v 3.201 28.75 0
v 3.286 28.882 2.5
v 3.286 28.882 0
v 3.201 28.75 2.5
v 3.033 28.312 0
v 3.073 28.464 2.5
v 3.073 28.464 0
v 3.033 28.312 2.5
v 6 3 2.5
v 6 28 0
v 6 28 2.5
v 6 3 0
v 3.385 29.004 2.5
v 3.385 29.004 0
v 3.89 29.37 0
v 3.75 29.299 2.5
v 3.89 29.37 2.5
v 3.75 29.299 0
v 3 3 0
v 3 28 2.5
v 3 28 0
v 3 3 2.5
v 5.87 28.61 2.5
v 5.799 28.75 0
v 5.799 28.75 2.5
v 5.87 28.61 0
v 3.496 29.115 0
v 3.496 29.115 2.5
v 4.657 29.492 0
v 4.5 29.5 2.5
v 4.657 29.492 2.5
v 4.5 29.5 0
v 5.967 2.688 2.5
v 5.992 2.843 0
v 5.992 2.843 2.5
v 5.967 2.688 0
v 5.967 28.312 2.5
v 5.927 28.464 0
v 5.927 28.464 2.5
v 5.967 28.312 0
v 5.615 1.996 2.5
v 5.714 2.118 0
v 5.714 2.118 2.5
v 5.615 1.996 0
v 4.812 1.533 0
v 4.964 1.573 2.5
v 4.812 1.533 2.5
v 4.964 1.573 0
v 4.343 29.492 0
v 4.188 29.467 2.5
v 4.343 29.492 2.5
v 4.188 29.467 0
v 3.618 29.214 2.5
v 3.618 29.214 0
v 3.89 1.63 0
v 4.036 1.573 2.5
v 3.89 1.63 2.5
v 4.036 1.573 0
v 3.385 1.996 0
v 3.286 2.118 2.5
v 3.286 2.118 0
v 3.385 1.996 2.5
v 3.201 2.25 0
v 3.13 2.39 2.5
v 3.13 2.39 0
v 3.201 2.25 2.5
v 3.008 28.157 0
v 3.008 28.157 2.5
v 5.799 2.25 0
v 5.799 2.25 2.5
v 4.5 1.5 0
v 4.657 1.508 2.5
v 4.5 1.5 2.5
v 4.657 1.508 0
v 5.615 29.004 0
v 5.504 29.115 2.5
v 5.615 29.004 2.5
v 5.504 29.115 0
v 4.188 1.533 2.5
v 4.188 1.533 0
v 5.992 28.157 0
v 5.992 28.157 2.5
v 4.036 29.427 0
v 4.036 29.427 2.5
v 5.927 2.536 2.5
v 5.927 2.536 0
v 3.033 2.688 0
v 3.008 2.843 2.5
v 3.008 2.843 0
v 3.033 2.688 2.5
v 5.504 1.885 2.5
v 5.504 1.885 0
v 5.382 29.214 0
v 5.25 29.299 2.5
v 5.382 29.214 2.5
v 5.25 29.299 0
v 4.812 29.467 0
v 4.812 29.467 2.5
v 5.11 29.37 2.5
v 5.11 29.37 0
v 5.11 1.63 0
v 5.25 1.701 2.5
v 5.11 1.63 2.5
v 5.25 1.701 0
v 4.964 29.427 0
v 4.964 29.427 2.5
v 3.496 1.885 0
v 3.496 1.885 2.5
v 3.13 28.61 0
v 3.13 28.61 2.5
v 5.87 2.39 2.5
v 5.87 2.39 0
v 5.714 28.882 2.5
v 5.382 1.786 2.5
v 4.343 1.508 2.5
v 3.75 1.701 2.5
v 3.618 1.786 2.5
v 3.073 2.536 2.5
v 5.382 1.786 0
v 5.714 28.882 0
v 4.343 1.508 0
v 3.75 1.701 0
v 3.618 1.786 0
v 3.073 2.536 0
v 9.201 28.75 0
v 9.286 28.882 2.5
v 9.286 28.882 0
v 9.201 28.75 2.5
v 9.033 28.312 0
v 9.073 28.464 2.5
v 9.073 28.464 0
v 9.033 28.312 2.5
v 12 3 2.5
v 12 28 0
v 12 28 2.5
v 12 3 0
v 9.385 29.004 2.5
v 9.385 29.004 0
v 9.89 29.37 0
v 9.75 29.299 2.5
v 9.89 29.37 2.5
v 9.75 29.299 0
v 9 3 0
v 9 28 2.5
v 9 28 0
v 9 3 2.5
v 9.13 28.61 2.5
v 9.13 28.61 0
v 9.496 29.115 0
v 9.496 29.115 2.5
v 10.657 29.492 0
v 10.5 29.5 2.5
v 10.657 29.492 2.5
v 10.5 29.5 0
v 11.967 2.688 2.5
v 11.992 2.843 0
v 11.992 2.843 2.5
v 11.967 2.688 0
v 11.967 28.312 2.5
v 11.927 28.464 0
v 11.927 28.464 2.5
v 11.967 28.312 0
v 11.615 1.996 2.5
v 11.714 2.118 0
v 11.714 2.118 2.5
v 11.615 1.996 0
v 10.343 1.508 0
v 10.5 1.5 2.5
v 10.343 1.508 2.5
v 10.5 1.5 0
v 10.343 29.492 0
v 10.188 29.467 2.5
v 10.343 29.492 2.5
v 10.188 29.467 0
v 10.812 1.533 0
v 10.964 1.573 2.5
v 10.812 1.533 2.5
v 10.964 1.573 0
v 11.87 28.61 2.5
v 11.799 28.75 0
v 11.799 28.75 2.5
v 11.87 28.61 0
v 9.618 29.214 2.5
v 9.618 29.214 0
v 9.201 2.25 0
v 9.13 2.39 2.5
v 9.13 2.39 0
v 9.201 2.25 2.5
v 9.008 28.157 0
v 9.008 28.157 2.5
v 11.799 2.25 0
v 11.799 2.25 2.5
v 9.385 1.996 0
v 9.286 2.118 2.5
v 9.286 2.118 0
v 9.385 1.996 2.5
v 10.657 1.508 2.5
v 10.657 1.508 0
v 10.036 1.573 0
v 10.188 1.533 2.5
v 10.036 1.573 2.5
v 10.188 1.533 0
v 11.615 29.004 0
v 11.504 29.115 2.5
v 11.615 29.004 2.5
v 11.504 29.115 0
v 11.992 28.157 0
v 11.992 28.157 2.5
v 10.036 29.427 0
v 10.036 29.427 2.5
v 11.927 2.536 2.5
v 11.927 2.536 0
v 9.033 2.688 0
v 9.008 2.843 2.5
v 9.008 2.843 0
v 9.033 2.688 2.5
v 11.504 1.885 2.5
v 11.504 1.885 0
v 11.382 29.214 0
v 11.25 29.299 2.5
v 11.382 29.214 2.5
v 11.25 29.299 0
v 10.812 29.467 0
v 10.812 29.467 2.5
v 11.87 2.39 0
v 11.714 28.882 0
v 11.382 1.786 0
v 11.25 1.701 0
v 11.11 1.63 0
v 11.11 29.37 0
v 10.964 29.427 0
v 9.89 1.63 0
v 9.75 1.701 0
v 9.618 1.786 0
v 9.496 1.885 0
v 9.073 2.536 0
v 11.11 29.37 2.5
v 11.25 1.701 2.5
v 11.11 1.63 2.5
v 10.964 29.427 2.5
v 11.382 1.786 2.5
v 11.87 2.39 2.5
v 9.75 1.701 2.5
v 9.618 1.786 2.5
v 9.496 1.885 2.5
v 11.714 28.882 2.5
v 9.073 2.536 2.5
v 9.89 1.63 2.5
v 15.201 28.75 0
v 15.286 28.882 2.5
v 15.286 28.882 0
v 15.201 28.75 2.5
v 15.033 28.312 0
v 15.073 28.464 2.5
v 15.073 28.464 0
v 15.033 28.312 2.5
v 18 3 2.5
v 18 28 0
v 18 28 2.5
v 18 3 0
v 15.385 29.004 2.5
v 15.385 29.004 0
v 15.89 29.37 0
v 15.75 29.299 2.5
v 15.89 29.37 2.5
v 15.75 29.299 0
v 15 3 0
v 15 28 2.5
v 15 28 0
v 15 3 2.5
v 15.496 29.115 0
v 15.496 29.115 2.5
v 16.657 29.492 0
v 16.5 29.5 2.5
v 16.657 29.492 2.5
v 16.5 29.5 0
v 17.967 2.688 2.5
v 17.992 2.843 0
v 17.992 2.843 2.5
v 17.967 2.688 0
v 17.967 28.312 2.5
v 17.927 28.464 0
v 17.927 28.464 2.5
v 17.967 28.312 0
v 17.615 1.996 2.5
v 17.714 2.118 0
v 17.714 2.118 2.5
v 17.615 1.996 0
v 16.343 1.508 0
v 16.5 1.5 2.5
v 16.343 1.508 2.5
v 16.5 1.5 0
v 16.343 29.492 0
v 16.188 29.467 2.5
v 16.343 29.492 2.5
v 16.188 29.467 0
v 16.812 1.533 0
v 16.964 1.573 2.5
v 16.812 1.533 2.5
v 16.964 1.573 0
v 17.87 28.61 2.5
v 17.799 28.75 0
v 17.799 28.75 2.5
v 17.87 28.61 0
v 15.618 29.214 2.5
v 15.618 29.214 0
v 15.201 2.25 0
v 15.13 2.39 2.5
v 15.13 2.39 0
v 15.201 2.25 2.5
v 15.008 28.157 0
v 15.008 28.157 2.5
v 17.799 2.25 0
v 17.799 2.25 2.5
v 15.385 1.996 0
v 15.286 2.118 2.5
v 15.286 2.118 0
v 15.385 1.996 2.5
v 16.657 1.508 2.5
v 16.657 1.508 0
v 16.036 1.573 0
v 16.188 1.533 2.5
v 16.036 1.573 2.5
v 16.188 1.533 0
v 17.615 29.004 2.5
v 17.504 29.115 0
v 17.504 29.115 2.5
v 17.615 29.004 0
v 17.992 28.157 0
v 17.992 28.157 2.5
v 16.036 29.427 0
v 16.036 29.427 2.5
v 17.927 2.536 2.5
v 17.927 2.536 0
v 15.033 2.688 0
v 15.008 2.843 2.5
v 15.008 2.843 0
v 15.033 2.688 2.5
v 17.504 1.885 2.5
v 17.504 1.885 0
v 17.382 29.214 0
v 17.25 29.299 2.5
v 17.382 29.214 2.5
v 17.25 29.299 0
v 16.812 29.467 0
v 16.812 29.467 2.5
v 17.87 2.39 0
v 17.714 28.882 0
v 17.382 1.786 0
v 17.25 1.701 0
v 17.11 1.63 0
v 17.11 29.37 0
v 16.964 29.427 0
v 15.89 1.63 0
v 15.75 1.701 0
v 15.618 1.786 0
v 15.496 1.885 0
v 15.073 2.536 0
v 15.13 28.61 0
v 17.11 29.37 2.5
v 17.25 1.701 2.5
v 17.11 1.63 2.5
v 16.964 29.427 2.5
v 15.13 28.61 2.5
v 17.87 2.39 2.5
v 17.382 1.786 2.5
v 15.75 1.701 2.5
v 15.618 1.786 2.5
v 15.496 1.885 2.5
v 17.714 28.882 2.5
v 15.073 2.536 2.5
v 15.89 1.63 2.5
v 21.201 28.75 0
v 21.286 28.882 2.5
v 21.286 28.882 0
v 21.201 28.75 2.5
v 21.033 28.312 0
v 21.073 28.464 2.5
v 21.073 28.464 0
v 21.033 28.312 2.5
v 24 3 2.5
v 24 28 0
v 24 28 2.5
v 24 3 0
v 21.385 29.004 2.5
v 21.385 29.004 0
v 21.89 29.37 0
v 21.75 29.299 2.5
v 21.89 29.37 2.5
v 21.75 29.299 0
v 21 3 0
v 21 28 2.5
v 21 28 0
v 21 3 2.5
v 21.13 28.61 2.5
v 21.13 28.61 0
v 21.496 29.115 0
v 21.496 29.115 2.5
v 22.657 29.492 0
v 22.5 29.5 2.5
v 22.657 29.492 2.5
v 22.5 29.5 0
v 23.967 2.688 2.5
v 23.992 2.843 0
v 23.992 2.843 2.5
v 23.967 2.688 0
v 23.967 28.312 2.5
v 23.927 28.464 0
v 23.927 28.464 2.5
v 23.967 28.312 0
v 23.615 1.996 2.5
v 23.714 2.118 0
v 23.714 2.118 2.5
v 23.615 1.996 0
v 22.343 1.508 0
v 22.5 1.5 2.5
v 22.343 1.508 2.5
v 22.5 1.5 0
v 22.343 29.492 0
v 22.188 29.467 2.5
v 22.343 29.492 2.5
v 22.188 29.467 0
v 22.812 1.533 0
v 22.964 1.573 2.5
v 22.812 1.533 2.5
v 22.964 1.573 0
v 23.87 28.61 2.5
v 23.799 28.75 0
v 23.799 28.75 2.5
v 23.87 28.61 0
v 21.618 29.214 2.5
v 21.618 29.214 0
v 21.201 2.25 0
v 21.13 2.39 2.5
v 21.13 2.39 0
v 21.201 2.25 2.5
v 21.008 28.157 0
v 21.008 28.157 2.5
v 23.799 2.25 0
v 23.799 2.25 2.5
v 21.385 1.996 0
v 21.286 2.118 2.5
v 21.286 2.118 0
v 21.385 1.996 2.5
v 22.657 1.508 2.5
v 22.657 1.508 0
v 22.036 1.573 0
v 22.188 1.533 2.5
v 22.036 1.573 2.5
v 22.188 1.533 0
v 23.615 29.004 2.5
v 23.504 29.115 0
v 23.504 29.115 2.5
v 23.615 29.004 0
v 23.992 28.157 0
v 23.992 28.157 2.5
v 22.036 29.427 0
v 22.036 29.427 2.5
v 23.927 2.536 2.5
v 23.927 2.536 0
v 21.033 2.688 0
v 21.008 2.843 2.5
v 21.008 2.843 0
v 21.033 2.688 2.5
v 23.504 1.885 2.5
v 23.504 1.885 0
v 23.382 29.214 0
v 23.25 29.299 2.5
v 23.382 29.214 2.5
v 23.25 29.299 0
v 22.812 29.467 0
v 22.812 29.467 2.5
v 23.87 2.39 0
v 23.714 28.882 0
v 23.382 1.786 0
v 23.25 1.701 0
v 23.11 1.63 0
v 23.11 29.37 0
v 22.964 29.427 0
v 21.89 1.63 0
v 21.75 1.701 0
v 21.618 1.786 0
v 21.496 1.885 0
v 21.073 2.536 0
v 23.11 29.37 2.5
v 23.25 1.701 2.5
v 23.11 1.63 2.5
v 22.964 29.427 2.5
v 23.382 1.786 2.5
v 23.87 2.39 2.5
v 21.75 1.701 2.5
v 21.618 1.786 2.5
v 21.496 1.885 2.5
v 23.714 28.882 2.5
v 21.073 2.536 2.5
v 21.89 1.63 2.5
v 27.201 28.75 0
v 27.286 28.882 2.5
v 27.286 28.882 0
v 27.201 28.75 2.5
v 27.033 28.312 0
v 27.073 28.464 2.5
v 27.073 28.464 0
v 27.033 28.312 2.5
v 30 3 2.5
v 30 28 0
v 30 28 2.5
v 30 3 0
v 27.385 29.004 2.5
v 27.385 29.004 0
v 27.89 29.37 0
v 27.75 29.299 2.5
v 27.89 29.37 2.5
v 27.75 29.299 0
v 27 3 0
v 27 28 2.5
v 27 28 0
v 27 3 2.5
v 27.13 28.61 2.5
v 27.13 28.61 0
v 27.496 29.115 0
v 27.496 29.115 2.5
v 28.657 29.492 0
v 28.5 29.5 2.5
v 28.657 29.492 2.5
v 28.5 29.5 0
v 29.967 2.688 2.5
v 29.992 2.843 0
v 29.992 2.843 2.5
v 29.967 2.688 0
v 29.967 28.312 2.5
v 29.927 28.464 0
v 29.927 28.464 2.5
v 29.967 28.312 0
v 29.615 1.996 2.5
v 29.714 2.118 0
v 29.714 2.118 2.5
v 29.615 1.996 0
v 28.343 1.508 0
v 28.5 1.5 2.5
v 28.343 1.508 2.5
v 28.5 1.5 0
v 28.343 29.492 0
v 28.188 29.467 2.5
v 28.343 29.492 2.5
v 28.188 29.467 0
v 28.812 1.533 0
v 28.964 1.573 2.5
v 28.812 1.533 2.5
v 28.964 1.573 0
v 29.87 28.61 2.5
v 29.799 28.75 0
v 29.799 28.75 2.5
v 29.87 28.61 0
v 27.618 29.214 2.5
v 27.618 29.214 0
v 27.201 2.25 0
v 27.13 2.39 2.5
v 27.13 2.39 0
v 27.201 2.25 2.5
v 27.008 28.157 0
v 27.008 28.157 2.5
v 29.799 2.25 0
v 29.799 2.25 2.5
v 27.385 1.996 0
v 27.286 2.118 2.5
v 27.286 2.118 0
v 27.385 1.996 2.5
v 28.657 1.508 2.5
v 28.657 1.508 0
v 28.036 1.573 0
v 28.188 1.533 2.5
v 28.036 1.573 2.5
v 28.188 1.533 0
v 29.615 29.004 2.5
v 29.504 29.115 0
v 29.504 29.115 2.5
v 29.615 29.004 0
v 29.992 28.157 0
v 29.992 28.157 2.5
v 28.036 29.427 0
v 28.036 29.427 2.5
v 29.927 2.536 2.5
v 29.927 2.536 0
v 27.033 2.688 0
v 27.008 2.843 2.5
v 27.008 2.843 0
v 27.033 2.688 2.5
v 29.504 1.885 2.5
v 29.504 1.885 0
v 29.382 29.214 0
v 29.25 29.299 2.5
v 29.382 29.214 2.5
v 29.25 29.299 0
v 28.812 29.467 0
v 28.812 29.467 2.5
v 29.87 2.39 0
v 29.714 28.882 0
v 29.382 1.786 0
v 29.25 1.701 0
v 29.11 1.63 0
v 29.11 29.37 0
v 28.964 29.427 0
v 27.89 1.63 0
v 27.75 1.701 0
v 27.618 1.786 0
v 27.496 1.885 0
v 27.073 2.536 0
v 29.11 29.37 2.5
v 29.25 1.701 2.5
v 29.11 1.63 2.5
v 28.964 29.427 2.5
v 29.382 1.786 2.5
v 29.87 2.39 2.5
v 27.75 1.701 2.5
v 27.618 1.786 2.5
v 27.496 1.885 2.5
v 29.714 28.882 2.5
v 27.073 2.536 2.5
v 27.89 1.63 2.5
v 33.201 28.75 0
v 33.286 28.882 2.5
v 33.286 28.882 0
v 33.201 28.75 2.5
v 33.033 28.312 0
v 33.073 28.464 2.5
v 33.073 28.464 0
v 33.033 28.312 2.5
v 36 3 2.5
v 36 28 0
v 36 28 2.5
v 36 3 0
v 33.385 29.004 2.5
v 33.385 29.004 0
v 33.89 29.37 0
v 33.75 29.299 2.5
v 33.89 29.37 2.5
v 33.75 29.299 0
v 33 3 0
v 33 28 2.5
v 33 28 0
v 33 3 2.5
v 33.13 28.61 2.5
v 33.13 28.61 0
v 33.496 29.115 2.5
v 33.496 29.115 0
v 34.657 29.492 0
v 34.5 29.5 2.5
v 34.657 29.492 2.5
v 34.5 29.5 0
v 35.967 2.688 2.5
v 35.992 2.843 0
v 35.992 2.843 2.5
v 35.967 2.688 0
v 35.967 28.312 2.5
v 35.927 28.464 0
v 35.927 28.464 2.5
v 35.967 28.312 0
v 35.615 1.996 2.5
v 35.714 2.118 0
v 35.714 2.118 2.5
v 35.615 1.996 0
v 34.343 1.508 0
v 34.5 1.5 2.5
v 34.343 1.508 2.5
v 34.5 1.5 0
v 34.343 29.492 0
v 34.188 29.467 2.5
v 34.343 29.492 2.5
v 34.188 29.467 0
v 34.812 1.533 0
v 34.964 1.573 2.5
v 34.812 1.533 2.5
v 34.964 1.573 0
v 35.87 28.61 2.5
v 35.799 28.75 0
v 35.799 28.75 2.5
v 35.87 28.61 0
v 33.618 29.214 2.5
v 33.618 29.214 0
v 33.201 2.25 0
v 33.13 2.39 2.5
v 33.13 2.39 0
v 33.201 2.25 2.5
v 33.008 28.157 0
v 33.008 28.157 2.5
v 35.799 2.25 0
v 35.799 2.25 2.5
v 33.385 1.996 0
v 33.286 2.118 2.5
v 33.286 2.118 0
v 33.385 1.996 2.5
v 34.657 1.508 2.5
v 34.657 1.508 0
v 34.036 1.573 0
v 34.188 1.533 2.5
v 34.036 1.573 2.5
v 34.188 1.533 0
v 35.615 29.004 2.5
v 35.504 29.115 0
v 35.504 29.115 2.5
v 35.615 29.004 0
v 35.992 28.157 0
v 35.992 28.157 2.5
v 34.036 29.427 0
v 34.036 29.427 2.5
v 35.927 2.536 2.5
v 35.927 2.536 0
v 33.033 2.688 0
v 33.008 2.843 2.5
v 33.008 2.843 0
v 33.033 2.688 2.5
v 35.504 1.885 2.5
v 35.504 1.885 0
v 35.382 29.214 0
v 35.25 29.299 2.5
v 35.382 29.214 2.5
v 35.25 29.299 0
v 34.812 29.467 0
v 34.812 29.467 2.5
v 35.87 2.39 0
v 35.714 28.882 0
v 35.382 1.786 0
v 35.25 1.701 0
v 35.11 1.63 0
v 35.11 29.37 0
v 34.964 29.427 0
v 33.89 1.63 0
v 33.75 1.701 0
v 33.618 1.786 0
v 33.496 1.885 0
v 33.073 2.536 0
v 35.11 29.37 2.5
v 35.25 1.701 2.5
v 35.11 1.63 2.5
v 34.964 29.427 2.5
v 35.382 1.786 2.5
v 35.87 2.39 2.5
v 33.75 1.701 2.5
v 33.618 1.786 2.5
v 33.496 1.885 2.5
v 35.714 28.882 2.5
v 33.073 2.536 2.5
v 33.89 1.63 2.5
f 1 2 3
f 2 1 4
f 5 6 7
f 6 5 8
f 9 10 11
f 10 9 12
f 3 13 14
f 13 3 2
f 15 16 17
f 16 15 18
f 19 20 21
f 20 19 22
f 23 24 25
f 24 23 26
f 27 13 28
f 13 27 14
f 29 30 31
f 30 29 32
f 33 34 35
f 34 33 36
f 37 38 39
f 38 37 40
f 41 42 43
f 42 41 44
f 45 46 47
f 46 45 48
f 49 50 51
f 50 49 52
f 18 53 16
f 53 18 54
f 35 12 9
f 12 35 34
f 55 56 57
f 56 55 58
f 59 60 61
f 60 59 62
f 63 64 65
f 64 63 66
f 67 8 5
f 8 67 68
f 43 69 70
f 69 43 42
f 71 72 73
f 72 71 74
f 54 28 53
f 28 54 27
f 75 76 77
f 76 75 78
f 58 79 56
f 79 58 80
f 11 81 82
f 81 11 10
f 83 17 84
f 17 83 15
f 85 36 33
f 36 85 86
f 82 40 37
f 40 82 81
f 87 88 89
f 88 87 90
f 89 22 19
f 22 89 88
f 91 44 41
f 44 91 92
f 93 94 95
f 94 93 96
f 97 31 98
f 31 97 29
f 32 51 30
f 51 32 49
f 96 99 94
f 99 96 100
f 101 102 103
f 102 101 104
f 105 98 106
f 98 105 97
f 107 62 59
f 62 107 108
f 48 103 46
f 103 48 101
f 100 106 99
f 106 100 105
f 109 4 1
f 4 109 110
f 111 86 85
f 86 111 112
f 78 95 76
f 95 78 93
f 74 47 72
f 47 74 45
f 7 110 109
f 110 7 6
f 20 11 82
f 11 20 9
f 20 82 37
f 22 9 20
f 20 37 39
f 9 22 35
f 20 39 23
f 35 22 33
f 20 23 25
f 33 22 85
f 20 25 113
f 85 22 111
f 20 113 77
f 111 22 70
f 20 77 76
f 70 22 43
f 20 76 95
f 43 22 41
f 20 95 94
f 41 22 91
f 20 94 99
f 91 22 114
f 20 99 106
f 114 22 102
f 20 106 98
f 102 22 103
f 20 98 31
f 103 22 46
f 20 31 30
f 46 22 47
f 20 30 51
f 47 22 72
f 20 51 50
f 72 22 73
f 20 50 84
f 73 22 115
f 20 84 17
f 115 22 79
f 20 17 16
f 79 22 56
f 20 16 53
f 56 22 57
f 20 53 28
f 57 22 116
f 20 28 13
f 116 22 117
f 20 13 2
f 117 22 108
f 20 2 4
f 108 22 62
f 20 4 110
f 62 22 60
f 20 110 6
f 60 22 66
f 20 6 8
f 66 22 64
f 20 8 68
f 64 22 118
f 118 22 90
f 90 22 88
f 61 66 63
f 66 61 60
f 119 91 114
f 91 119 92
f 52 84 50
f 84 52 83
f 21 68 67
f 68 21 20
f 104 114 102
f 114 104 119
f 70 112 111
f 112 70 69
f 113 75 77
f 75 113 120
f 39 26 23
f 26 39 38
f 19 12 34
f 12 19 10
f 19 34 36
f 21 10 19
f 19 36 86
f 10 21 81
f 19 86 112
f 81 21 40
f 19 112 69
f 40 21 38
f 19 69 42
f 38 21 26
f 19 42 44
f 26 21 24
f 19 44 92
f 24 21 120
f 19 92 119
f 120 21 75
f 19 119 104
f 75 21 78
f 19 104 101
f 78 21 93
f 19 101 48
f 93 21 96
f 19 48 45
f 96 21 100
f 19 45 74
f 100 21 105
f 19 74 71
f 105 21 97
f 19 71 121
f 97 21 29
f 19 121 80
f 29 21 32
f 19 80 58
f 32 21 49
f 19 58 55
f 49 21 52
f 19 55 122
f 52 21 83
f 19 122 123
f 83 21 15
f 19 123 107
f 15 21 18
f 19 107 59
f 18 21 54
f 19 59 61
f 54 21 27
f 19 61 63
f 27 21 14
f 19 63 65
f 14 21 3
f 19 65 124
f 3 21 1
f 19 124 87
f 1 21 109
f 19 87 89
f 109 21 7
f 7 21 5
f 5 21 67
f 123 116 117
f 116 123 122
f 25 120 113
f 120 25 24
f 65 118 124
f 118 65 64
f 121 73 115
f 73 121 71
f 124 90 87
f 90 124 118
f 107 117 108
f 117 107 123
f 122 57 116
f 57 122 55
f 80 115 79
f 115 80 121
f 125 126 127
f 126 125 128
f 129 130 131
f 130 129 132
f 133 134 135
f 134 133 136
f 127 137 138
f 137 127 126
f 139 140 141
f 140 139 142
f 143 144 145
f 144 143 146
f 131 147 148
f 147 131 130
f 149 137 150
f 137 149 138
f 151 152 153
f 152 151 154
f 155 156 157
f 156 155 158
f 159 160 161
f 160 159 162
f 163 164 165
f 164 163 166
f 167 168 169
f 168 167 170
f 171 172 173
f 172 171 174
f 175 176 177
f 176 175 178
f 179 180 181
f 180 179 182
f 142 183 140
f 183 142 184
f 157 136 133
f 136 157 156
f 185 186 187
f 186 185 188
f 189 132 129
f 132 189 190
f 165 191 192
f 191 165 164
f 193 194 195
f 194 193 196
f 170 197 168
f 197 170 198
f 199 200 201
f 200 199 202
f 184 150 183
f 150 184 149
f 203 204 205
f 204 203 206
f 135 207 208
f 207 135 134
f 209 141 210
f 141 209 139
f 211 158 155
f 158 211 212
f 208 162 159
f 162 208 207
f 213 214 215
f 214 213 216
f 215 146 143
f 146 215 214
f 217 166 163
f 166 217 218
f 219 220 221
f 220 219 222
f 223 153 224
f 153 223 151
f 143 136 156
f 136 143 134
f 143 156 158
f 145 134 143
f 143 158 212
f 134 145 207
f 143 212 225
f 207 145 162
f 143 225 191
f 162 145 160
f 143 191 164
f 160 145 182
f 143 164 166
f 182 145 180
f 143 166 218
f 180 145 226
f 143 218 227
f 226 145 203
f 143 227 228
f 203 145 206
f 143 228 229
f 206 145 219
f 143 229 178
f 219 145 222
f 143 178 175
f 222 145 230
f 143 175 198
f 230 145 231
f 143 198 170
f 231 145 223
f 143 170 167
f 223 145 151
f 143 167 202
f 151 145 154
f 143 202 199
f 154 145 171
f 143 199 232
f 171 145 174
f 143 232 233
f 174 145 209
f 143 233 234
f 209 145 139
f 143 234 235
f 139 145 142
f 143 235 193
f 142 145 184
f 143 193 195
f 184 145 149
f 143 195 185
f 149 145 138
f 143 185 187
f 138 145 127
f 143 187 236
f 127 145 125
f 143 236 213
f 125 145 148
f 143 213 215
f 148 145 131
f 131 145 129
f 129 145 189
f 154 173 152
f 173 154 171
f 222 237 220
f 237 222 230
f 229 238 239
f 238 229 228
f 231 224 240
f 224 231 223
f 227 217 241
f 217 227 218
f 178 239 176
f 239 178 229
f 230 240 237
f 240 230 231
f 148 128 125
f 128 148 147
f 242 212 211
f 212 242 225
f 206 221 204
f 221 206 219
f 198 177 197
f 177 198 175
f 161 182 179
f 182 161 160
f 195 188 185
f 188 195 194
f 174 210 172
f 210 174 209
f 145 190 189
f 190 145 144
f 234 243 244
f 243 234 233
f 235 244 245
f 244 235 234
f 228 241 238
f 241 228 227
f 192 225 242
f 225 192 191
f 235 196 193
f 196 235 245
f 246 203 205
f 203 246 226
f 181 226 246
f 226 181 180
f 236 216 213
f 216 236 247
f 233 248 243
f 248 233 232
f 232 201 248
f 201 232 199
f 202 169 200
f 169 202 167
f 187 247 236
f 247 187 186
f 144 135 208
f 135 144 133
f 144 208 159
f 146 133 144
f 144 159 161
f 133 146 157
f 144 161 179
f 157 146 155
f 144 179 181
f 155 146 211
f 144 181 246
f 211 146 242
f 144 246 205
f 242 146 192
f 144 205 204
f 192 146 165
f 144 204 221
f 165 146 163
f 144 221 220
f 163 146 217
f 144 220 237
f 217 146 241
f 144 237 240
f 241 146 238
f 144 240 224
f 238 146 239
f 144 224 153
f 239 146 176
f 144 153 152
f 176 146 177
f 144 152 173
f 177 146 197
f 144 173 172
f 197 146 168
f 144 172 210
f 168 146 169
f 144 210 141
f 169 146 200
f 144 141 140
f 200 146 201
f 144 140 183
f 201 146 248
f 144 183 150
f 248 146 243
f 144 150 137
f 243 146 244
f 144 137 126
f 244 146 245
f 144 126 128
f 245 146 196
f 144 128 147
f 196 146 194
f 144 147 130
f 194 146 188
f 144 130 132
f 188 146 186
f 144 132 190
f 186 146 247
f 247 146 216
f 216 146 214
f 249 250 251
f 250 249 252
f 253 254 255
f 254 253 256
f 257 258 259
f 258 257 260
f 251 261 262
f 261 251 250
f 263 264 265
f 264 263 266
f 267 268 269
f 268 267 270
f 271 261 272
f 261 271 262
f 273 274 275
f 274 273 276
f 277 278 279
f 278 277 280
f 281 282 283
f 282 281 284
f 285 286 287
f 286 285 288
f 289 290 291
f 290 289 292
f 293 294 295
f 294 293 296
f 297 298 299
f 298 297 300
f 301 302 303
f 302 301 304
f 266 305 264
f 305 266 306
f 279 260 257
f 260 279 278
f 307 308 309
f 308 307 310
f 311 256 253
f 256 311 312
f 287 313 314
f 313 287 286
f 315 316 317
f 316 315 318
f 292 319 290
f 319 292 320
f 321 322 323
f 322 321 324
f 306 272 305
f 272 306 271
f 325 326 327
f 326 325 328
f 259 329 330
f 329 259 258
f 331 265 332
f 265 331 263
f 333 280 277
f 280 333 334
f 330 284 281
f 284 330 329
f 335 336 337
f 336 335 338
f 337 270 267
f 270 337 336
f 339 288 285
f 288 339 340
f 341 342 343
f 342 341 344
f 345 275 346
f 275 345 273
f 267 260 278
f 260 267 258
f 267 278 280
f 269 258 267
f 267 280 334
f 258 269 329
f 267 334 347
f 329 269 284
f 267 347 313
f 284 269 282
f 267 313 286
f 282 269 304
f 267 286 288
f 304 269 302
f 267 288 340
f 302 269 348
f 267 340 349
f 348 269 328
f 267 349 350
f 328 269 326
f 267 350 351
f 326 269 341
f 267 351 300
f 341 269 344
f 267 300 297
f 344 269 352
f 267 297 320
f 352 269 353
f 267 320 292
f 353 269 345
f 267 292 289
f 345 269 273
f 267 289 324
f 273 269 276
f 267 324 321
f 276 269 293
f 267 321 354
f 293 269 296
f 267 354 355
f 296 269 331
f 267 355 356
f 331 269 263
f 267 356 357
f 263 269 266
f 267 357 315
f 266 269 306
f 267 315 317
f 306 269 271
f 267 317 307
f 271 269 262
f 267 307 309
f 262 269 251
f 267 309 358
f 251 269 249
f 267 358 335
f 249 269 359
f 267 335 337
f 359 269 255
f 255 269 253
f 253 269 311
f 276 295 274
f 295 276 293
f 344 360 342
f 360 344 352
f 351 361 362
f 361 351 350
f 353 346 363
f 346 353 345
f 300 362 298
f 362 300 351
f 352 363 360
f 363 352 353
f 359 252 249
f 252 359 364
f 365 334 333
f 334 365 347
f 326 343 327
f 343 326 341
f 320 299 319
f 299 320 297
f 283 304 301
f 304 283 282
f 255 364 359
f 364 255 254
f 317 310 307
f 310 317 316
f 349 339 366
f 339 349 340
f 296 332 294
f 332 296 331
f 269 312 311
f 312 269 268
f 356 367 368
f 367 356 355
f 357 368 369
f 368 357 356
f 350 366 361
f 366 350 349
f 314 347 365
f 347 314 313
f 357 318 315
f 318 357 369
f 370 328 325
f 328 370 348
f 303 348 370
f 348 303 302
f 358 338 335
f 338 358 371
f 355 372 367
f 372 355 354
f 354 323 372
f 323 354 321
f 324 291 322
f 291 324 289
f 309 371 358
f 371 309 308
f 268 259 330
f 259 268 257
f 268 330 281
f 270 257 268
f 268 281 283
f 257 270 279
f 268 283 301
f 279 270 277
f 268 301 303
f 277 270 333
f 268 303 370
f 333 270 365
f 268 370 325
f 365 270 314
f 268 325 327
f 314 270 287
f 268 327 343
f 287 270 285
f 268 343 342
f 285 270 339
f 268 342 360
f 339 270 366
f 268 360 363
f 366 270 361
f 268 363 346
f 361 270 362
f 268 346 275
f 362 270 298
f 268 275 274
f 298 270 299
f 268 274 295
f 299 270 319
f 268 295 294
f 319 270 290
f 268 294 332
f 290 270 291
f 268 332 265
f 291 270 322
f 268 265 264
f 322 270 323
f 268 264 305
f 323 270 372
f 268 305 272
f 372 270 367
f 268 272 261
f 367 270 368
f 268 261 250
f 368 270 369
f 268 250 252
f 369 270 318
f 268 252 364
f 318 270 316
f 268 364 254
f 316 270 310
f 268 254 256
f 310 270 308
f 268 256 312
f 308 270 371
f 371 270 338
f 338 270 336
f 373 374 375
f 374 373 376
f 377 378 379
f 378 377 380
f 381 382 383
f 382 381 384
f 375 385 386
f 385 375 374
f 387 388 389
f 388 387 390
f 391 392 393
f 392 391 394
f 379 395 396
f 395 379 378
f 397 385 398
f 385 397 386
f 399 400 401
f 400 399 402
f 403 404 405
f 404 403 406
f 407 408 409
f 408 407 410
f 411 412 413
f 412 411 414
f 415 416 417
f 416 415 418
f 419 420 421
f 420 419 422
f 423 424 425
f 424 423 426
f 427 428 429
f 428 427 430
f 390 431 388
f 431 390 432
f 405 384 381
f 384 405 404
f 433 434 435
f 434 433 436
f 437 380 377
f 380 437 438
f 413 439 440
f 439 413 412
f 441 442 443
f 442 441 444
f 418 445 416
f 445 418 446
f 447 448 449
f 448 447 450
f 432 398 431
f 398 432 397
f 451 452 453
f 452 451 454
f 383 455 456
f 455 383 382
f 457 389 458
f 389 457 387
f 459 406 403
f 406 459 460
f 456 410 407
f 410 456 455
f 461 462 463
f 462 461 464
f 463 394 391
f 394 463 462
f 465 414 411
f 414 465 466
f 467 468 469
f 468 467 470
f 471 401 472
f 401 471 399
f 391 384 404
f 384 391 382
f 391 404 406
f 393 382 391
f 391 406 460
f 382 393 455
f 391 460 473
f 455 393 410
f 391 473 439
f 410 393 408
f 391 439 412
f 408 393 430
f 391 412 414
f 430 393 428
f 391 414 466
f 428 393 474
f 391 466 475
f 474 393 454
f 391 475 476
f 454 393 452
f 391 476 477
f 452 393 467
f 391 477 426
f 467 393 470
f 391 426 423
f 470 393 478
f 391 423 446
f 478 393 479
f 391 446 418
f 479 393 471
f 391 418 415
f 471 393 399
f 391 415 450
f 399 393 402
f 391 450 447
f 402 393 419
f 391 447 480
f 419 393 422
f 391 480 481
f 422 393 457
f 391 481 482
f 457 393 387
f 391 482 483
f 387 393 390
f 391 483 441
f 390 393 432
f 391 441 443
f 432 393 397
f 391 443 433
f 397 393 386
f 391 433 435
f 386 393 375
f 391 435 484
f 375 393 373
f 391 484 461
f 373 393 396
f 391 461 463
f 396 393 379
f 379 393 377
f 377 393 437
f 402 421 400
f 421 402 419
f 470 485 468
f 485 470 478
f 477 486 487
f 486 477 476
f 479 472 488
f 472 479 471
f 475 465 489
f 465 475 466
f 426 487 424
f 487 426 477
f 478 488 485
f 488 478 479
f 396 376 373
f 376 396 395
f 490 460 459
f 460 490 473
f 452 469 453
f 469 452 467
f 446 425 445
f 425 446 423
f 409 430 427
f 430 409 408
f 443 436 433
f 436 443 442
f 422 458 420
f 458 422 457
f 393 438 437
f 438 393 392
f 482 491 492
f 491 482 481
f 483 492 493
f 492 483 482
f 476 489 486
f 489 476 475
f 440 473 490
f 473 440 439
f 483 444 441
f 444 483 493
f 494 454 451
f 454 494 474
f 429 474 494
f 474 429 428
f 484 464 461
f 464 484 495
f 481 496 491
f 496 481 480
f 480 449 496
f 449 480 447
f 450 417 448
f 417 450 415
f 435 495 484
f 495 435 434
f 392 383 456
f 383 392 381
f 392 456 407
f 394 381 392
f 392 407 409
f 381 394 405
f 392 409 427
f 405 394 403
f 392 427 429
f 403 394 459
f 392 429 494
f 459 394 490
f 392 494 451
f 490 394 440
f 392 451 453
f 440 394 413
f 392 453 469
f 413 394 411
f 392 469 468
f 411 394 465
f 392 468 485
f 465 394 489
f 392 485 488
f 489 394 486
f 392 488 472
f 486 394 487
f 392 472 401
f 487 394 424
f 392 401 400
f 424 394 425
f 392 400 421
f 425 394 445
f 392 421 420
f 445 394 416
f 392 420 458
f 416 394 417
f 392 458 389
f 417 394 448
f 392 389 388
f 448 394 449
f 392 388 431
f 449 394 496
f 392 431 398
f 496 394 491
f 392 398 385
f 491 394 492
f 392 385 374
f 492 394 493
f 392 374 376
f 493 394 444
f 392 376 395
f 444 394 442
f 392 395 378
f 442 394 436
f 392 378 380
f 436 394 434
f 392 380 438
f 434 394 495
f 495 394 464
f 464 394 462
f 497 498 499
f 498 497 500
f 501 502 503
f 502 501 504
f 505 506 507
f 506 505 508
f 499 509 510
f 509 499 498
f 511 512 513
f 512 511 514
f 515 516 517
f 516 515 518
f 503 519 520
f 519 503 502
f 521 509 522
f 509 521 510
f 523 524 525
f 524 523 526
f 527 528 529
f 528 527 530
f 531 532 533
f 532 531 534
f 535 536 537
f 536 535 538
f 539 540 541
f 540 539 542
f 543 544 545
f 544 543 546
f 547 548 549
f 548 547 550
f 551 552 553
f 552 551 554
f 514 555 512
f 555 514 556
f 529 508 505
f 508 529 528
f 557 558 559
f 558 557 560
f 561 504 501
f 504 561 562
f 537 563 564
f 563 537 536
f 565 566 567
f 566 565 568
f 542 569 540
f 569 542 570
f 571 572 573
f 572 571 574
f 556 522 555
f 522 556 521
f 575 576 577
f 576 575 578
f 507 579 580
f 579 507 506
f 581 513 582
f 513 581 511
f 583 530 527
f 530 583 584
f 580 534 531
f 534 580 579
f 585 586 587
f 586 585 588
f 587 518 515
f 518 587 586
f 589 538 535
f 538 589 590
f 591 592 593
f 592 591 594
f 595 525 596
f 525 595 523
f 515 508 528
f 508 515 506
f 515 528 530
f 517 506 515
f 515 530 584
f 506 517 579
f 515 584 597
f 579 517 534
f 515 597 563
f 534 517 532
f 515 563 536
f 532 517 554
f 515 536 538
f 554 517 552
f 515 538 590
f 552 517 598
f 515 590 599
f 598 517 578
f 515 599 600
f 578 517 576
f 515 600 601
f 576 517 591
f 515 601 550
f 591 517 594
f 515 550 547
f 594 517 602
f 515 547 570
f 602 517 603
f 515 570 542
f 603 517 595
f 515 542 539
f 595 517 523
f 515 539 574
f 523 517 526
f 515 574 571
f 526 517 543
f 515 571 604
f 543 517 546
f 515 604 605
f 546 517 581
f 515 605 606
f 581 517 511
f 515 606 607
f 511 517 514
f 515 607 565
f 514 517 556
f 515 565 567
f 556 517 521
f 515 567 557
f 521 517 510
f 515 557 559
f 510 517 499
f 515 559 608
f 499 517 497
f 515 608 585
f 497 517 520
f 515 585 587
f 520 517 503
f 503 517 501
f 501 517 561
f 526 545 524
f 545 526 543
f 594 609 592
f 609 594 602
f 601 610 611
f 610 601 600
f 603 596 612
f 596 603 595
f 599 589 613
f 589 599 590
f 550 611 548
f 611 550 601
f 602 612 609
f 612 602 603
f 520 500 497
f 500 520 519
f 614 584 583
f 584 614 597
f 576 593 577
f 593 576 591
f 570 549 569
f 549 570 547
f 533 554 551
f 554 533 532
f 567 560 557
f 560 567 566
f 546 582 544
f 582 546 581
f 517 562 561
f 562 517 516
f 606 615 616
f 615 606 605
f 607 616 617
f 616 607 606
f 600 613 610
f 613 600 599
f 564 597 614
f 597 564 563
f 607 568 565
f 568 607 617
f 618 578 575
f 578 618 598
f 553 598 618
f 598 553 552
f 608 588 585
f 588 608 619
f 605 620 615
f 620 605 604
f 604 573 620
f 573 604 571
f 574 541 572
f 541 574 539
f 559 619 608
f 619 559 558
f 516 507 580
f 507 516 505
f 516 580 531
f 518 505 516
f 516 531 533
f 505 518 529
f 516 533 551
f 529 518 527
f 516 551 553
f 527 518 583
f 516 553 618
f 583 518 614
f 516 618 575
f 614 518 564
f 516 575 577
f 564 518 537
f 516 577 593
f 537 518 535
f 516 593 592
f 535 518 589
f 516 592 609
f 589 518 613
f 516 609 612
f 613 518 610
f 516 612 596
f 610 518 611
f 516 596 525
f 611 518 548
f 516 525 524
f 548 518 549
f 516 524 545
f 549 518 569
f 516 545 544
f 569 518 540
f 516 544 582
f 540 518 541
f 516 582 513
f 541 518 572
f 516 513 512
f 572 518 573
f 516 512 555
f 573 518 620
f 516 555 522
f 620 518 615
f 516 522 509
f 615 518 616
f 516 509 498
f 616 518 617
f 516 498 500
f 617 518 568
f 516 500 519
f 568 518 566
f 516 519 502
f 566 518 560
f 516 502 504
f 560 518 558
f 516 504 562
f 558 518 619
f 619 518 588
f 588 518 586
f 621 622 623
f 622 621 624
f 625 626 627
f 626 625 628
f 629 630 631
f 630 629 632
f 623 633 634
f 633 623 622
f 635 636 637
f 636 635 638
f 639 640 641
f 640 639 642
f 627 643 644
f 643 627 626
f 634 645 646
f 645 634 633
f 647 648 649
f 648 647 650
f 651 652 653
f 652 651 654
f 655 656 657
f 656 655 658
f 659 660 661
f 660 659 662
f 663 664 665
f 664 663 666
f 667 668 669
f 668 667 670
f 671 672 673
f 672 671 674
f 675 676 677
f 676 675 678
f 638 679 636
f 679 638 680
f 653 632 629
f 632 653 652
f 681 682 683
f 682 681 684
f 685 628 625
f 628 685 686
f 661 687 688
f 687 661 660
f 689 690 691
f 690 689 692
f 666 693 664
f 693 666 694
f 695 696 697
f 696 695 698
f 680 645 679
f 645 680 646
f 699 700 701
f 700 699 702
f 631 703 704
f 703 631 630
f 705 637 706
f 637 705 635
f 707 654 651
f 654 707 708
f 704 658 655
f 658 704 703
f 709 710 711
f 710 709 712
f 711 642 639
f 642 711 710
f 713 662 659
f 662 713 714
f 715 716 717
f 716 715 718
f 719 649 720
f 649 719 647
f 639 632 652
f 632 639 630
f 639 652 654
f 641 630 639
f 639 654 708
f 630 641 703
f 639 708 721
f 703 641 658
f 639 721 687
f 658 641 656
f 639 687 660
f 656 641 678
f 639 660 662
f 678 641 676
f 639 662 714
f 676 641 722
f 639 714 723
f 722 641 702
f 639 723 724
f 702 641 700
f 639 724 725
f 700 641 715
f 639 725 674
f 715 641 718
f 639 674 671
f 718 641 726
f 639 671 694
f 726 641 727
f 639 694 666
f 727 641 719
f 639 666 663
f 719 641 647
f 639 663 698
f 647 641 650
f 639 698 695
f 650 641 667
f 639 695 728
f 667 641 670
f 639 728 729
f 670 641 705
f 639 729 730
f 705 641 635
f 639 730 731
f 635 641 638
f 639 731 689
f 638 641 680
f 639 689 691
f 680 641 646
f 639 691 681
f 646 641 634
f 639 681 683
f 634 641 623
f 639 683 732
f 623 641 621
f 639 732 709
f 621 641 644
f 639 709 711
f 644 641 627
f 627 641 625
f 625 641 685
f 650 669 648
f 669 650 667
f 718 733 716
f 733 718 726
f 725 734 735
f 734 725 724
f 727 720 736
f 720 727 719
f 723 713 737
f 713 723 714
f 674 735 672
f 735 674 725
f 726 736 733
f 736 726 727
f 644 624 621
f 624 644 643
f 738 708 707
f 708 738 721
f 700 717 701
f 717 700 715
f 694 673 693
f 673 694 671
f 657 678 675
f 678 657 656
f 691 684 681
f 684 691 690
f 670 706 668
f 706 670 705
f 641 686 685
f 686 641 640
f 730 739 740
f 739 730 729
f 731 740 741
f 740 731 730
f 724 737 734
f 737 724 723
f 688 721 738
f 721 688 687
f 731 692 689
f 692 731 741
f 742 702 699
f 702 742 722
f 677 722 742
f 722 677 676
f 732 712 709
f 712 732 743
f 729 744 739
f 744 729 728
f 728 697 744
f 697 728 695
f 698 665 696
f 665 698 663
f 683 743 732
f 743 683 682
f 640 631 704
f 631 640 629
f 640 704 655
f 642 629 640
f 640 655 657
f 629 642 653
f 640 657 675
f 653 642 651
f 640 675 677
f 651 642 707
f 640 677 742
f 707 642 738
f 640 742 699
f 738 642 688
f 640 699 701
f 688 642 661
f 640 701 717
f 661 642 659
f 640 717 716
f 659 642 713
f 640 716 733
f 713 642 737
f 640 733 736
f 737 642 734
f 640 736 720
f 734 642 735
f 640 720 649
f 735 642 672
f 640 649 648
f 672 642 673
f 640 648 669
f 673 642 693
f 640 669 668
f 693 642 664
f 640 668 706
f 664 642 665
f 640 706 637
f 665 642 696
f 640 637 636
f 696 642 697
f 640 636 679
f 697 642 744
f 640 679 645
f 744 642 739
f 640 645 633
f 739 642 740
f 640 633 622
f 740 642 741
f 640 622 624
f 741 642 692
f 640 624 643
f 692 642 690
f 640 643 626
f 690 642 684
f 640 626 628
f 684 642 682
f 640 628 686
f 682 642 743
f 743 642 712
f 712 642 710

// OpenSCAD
totalWidth 			= 	40	;
totalHeight 		= 	30	;
materialThickness	=	2.5	;
slotThickness		=	3	;

slotNo = 6;


%cube ([totalWidth,totalHeight, slotThickness]);
//dimensions();
$fn = 60;

translate ([(slotThickness*slotNo*2)/slotNo - slotThickness/2, materialThickness + .5,0])
	slot();

module dimensions(){
	cube ([totalWidth, totalHeight, materialThickness]);
}

module slot(){
	for (i = [0:slotNo - 1]){
		translate ([i*slotThickness*2,0,0]){
			hull(){
				cylinder (r=slotThickness/2, h = materialThickness);
				translate ([0,totalHeight - materialThickness - slotThickness/2 - 1, 0])
					cylinder (r=slotThickness/2, h = materialThickness);
			}
		}
	}

}
